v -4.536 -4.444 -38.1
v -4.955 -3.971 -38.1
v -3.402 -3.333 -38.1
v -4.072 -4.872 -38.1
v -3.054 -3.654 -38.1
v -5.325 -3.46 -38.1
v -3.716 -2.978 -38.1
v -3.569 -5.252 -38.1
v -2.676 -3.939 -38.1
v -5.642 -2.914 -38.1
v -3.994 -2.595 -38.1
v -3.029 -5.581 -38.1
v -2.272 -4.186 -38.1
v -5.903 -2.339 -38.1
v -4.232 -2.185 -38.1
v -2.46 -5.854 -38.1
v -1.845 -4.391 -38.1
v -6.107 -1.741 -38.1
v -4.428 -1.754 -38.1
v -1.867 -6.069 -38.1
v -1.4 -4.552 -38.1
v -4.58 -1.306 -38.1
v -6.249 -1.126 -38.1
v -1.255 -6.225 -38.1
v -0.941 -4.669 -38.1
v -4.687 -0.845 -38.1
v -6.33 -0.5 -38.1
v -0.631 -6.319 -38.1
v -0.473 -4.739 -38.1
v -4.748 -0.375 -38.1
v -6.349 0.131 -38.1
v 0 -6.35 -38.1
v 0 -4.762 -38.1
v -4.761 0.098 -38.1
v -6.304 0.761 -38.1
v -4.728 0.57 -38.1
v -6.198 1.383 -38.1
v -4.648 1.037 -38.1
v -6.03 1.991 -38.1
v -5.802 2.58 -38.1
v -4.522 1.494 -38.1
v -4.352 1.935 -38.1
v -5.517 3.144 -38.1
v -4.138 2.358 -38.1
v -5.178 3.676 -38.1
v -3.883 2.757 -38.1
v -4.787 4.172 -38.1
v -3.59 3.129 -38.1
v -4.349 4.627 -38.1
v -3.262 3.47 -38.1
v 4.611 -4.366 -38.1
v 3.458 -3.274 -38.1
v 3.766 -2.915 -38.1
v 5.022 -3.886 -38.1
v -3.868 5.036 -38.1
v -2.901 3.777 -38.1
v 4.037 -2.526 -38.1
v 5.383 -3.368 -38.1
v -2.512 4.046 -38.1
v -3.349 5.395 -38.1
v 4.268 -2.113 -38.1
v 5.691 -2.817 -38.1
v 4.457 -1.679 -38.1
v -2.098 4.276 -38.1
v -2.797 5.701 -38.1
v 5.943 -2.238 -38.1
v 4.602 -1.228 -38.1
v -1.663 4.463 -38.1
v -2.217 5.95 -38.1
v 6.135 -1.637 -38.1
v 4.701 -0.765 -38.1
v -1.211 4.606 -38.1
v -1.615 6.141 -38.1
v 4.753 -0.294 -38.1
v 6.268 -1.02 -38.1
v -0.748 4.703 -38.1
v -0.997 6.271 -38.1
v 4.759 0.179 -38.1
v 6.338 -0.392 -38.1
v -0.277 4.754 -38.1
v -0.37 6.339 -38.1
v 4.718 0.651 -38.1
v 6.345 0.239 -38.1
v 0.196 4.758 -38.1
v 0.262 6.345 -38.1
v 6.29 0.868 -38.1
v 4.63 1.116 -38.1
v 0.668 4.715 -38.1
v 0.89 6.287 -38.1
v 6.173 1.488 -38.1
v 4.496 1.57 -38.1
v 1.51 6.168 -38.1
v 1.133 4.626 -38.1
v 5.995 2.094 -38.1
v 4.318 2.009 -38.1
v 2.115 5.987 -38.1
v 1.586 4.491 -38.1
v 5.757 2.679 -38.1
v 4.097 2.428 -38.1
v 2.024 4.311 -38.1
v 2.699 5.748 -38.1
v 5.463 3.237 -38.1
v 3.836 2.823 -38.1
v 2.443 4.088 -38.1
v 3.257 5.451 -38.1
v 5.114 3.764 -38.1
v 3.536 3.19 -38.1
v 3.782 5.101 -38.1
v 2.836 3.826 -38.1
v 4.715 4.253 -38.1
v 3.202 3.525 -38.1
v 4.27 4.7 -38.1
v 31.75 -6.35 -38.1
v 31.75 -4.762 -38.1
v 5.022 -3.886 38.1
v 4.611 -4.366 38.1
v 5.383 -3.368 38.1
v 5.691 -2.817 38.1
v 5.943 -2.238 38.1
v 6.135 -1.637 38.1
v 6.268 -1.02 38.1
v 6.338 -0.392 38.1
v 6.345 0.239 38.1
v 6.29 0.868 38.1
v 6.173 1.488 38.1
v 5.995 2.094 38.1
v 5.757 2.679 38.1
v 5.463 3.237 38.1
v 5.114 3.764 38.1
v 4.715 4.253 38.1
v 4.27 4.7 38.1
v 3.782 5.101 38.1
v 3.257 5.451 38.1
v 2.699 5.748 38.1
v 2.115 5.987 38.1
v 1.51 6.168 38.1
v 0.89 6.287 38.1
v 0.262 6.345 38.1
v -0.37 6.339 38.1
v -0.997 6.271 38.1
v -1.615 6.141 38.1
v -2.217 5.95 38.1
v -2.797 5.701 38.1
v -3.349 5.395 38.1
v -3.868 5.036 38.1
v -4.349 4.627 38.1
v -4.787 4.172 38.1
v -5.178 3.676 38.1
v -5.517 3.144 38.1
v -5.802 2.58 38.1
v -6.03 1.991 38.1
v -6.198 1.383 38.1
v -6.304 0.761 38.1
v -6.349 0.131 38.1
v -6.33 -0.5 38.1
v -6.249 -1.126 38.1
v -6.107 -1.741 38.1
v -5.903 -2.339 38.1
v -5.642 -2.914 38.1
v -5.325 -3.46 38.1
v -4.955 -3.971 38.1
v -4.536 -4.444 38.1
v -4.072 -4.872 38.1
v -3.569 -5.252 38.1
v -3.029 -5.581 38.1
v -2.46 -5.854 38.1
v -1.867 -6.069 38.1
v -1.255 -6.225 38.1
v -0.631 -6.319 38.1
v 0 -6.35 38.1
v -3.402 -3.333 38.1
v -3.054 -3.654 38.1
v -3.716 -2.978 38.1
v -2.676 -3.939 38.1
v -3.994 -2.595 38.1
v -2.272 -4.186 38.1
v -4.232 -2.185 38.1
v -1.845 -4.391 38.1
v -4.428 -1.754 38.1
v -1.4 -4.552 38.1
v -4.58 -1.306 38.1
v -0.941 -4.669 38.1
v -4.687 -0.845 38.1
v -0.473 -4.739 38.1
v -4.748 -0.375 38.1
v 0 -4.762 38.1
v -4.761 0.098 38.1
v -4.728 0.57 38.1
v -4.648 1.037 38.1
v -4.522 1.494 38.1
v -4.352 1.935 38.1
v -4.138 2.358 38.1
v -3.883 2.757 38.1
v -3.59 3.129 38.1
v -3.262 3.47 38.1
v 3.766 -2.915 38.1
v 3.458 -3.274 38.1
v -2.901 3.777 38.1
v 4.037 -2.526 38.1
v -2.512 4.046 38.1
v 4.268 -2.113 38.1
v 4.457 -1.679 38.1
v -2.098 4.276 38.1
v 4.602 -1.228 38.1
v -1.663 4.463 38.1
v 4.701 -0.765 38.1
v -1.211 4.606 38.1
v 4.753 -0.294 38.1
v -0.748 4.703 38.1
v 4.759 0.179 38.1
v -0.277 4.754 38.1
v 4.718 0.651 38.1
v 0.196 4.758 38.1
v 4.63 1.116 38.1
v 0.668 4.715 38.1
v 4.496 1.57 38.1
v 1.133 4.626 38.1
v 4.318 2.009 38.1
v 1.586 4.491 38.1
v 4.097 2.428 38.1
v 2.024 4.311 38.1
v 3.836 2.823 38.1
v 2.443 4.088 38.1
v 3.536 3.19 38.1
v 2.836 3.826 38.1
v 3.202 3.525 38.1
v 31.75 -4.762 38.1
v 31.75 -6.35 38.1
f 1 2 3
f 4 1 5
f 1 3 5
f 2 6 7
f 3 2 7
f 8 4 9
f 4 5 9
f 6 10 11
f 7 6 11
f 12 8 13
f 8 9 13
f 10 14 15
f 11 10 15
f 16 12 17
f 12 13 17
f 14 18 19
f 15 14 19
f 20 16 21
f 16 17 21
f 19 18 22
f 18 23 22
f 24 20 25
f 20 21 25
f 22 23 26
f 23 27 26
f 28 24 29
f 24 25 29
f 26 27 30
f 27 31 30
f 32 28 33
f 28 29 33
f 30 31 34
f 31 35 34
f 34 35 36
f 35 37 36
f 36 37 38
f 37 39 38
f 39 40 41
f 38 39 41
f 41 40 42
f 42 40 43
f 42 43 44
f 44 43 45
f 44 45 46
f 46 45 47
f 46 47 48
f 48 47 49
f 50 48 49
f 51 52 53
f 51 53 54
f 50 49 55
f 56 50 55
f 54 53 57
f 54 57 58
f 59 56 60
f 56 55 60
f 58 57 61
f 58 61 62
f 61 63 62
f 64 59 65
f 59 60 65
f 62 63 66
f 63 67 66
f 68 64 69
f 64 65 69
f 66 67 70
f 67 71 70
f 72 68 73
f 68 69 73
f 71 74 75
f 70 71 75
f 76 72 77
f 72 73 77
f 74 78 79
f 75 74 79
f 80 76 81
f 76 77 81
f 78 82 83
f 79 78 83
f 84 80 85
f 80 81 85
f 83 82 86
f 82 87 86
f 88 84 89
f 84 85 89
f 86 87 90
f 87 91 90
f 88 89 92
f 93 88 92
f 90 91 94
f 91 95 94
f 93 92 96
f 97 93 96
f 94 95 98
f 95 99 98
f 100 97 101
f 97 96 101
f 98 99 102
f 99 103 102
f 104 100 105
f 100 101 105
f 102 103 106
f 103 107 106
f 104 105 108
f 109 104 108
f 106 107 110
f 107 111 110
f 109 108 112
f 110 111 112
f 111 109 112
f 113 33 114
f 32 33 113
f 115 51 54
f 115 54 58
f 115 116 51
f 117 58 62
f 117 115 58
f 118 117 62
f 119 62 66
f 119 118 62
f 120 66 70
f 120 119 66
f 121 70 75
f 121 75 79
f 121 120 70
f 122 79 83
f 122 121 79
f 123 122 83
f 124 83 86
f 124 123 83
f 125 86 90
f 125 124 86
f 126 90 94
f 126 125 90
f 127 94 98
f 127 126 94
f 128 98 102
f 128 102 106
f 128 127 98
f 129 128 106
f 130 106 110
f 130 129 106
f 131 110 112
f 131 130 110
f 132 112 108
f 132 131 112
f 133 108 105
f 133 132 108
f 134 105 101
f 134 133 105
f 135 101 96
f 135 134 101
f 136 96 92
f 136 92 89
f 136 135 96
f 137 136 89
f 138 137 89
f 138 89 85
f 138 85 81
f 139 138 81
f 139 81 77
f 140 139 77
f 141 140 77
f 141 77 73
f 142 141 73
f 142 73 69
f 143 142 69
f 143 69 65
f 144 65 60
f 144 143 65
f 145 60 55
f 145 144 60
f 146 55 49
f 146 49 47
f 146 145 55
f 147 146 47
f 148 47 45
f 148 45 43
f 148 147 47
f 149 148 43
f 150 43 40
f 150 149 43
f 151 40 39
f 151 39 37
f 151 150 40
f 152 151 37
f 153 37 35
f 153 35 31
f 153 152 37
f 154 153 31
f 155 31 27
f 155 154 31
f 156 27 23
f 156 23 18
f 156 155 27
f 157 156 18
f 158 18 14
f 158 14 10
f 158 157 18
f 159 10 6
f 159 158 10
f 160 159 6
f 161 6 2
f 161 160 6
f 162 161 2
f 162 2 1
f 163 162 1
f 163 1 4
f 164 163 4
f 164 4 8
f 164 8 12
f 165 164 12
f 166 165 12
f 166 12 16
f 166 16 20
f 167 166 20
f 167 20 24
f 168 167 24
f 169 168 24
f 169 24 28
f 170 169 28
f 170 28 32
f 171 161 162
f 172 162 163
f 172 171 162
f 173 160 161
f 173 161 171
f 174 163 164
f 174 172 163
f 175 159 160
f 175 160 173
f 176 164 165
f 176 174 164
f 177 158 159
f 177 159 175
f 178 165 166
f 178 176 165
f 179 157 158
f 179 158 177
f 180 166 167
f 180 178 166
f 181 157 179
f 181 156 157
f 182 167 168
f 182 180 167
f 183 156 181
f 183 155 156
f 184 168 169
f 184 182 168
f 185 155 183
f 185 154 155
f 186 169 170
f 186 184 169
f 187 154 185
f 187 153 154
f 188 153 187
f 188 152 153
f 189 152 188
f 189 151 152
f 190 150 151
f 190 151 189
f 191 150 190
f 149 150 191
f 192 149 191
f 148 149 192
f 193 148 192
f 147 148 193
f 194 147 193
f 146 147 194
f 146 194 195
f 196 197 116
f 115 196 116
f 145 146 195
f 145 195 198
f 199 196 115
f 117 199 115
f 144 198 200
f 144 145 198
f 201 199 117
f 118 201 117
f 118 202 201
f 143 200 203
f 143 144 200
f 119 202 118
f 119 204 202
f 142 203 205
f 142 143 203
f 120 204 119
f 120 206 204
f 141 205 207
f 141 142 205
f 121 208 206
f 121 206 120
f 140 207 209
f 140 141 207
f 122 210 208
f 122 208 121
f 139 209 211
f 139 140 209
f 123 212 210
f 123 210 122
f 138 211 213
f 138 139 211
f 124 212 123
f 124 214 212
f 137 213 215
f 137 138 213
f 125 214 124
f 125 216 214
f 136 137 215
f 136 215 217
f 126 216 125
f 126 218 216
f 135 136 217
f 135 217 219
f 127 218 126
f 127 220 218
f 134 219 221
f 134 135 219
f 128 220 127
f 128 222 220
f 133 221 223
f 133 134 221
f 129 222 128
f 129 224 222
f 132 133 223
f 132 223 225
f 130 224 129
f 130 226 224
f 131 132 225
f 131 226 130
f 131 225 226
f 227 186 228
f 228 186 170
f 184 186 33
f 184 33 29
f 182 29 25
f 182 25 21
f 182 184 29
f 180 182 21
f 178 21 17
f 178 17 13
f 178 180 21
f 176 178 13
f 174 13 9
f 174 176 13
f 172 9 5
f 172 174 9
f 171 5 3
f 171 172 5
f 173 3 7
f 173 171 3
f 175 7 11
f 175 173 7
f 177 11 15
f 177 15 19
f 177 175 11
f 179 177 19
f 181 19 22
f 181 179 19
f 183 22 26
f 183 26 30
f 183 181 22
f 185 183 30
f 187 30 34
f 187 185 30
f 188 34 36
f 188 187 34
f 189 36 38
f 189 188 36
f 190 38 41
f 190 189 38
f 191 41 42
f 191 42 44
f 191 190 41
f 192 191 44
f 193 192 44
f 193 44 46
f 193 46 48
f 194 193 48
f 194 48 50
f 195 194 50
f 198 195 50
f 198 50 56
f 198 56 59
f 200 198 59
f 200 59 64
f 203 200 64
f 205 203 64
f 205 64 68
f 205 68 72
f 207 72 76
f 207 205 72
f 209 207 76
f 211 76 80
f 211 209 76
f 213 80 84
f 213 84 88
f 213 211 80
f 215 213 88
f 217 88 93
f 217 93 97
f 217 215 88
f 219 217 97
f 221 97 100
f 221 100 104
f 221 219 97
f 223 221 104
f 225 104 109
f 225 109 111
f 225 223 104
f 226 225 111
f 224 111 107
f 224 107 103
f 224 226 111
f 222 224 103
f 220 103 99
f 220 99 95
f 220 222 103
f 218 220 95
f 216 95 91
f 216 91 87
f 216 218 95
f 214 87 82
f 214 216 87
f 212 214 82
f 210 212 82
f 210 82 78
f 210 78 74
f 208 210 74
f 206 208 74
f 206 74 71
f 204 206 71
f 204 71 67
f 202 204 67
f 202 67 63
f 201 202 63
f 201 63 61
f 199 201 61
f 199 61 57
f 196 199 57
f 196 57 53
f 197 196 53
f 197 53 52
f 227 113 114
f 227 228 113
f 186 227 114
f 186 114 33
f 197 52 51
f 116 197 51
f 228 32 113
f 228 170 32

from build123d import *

# Parameters (mm, degrees)
F1_DEPTH = 38.1


with BuildPart() as f1:
    # F0 (on Top) → F1 (new body, symmetric)
    with BuildSketch(Plane.XY):
        with BuildLine():
            Line((31.75, -6.35), (31.75, -4.7625))
            Line((31.75, -4.7625), (0, -4.7625))
            ThreePointArc((0, -4.7625), (-1.882543, 4.374636), (3.458453, -3.274219))
            Line((3.458453, -3.274219), (4.611271, -4.365625))
            ThreePointArc((4.611271, -4.365625), (-2.510058, 5.832847), (0, -6.35))
            Line((0, -6.35), (31.75, -6.35))
        make_face()
    extrude(amount=F1_DEPTH, both=True)


solid = f1.part
